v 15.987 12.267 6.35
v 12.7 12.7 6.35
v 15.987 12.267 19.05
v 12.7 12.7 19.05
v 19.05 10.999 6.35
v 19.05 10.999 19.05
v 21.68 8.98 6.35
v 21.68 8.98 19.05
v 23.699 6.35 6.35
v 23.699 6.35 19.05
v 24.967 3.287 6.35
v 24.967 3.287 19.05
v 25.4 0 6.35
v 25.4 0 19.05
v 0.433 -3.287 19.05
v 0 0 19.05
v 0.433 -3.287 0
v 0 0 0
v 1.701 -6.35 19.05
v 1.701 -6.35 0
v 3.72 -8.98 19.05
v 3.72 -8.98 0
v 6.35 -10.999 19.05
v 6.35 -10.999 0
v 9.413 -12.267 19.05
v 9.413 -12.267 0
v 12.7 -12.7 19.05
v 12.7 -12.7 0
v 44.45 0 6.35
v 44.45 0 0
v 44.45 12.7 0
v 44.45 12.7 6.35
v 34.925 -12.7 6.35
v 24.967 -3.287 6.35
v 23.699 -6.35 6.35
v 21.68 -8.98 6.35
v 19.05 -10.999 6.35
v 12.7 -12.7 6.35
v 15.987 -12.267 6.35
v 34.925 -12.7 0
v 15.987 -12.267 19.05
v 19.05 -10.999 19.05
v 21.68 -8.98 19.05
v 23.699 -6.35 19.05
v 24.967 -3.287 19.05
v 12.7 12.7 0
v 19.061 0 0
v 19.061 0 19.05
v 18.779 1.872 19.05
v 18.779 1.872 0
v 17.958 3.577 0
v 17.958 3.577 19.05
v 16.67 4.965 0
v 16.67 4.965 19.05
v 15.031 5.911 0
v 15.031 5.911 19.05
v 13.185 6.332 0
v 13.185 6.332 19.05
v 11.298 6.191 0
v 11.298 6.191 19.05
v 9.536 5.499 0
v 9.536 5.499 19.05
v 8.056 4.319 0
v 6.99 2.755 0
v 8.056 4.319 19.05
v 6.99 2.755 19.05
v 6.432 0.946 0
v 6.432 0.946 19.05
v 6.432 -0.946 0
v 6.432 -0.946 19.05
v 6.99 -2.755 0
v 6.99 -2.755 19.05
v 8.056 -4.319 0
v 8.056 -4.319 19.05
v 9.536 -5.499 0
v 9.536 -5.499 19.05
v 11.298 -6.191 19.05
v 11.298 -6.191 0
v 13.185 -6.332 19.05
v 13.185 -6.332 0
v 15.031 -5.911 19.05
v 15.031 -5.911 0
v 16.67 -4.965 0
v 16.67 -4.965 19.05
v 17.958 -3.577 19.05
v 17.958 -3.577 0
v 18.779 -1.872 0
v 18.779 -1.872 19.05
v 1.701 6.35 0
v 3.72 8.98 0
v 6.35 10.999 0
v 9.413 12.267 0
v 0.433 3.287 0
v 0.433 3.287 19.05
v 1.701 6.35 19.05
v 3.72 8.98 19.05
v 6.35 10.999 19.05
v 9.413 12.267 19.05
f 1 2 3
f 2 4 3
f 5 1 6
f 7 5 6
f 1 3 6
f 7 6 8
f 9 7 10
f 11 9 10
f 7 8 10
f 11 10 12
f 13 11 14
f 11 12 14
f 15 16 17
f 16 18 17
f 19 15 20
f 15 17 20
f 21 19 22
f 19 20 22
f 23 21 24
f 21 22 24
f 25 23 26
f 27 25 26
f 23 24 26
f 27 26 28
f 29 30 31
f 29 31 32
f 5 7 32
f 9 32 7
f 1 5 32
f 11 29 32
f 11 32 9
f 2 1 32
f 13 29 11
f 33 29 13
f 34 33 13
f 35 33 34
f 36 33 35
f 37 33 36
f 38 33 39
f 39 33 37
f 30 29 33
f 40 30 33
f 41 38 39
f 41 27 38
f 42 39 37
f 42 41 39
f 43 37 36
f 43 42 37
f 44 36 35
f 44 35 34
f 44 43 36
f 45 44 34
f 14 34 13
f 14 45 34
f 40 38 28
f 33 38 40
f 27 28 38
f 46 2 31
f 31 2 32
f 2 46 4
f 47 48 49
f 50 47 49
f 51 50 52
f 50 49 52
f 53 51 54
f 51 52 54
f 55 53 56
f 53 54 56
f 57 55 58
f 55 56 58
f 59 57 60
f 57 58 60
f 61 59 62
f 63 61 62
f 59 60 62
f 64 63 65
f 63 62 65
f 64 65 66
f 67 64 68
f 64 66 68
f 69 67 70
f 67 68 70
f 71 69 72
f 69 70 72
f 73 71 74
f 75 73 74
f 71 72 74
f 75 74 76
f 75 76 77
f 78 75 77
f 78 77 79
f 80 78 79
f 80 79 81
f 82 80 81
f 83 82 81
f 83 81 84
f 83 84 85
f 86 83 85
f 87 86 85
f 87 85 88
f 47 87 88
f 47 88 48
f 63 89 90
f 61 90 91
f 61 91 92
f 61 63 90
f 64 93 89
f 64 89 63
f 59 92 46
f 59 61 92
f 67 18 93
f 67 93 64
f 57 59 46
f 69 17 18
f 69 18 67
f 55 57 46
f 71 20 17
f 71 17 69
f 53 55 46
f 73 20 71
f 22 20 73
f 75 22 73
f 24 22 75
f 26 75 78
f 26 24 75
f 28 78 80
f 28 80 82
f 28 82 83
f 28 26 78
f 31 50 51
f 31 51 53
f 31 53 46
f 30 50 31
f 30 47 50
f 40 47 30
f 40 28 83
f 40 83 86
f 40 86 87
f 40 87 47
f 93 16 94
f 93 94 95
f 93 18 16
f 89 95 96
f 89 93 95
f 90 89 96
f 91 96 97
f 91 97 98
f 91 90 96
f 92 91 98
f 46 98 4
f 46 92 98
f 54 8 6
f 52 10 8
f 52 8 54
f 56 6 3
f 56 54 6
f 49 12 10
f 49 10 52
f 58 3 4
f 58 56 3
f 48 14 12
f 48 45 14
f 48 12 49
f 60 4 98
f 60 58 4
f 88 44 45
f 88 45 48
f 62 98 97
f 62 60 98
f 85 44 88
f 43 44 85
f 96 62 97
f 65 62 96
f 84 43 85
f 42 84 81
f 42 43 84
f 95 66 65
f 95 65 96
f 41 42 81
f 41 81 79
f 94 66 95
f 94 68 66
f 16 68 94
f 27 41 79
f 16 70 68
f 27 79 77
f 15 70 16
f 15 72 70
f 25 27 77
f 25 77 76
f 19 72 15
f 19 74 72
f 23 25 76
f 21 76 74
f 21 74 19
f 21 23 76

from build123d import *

# Parameters (mm, degrees)
F1_DEPTH = 12.7
F3_DEPTH = 6.351
F4_R     = 6.35
F5_DEPTH = 19.051
F6_R     = 12.7
F7_R     = 12.69999
F8_R     = 12.69999
F9_R     = 12.7


# Not quite as in the source:
# - a fillet or chamfer is up to 0.001 mm smaller than in the source, because OpenCascade refuses the exact size


with BuildPart() as f1:
    # F0 (on Front) → F1 (new body, symmetric)
    with BuildSketch(Plane.XZ):
        Polygon((0, 19.05), (0, 0), (44.45, 0), (44.45, 6.35), (25.4, 6.35), (25.4, 19.05), align=None)
    extrude(amount=F1_DEPTH, both=True)

    # F2 (on face) → F3 (cut, through all)
    with BuildSketch(Plane.XY.offset(6.35)):
        Polygon((34.925, -12.7), (44.45, -12.7), (44.45, 0), align=None)
    extrude(amount=-F3_DEPTH, mode=Mode.SUBTRACT)

    # F4 (on face) → F5 (cut, through all)
    with BuildSketch(Plane.XY.offset(19.05)):
        with Locations((12.7109484747, 0)):
            Circle(F4_R)
    extrude(amount=-F5_DEPTH, mode=Mode.SUBTRACT)

    # F6
    f6_edges = [f1.edges().sort_by_distance(p)[0] for p in [
        (0, -12.7, 9.525),
    ]]
    fillet(f6_edges, radius=F6_R)

    # F7 (radius 12.7 in the source; OpenCascade refuses exactly that, so slightly less here)
    f7_edges = [f1.edges().sort_by_distance(p)[0] for p in [
        (0, 12.7, 9.525),
    ]]
    fillet(f7_edges, radius=F7_R)

    # F8 (radius 12.7 in the source; OpenCascade refuses exactly that, so slightly less here)
    f8_edges = [f1.edges().sort_by_distance(p)[0] for p in [
        (25.4, -12.7, 12.7),
    ]]
    fillet(f8_edges, radius=F8_R)

    # F9
    f9_edges = [f1.edges().sort_by_distance(p)[0] for p in [
        (25.4, 12.7, 12.7),
    ]]
    fillet(f9_edges, radius=F9_R)


solid = f1.part
